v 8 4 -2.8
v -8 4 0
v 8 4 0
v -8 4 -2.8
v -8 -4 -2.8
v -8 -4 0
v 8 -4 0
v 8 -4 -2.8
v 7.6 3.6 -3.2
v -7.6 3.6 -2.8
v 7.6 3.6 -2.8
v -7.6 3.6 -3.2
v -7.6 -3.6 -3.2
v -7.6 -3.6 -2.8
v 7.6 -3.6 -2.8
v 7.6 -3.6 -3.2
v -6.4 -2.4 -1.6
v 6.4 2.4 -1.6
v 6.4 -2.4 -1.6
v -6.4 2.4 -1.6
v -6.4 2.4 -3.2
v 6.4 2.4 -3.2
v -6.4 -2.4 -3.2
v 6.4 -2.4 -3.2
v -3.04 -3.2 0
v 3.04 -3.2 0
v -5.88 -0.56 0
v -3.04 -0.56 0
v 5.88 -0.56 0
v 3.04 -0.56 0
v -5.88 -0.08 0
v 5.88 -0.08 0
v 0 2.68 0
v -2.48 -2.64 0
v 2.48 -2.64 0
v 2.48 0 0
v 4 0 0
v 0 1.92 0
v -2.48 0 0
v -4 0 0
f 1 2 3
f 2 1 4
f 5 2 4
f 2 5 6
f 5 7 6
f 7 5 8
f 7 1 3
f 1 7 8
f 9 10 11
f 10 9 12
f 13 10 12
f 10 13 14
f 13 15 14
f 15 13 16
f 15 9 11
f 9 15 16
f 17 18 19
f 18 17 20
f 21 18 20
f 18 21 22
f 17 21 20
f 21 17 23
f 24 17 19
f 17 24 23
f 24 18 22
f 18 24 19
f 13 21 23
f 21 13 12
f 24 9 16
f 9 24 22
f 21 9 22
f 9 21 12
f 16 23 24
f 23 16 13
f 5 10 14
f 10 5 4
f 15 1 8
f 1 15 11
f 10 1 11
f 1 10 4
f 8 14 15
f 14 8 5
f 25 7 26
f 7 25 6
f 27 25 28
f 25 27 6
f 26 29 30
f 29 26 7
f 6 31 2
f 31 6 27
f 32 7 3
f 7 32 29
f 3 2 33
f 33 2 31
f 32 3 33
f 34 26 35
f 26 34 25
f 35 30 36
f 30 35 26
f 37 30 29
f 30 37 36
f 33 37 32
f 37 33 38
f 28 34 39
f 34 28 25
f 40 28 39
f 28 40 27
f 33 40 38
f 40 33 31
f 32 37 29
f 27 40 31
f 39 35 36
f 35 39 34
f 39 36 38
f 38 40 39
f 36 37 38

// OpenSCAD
// file: ../p/box5.scad
use <../lib.scad>
function ldraw_lib__box5() = [
// 0 Box with 5 Faces and All Edges
// 0 Name: box5.dat
// 0 Author: James Jessiman
// 0 !LDRAW_ORG Primitive UPDATE 2012-01
// 0 !LICENSE Licensed under CC BY 2.0 and CC BY 4.0 : see CAreadme.txt
// 
// 0 BFC CERTIFY CCW
  [0,"BFC","CERTIFY"],
  [0,"BFC","CCW"],
// 
// 0 !HISTORY 2002-04-03 [sbliss] Modified for BFC compliance
// 0 !HISTORY 2002-04-25 [PTadmin] Official Update 2002-02
// 0 !HISTORY 2007-06-24 [PTadmin] Header formatted for Contributor Agreement
// 0 !HISTORY 2008-07-01 [PTadmin] Official Update 2008-01
// 0 !HISTORY 2012-02-16 [Philo] Changed to CCW
// 0 !HISTORY 2012-03-30 [PTadmin] Official Update 2012-01
// 
// 
// 2 24 1 1 1 -1 1 1
  [2,24,1,1,1,-1,1,1],
// 2 24 -1 1 1 -1 1 -1
  [2,24,-1,1,1,-1,1,-1],
// 2 24 -1 1 -1 1 1 -1
  [2,24,-1,1,-1,1,1,-1],
// 2 24 1 1 -1 1 1 1
  [2,24,1,1,-1,1,1,1],
// 2 24 1 0 1 -1 0 1
  [2,24,1,0,1,-1,0,1],
// 2 24 -1 0 1 -1 0 -1
  [2,24,-1,0,1,-1,0,-1],
// 2 24 -1 0 -1 1 0 -1
  [2,24,-1,0,-1,1,0,-1],
// 2 24 1 0 -1 1 0 1
  [2,24,1,0,-1,1,0,1],
// 2 24 1 0 1 1 1 1
  [2,24,1,0,1,1,1,1],
// 2 24 -1 0 1 -1 1 1
  [2,24,-1,0,1,-1,1,1],
// 2 24 1 0 -1 1 1 -1
  [2,24,1,0,-1,1,1,-1],
// 2 24 -1 0 -1 -1 1 -1
  [2,24,-1,0,-1,-1,1,-1],
// 4 16 -1 1 1 1 1 1 1 1 -1 -1 1 -1
  [4,16,-1,1,1,1,1,1,1,1,-1,-1,1,-1],
// 4 16 -1 1 1 -1 0 1 1 0 1 1 1 1
  [4,16,-1,1,1,-1,0,1,1,0,1,1,1,1],
// 4 16 -1 1 -1 -1 0 -1 -1 0 1 -1 1 1
  [4,16,-1,1,-1,-1,0,-1,-1,0,1,-1,1,1],
// 4 16 1 1 -1 1 0 -1 -1 0 -1 -1 1 -1
  [4,16,1,1,-1,1,0,-1,-1,0,-1,-1,1,-1],
// 4 16 1 1 1 1 0 1 1 0 -1 1 1 -1
  [4,16,1,1,1,1,0,1,1,0,-1,1,1,-1],
];
makepoly(ldraw_lib__box5(), line=0.2);
// file: ../p/box4.scad
use <../lib.scad>
function ldraw_lib__box4() = [
// 0 Box with 4 Faces (2 Parallel Pairs) and All Edges
// 0 Name: box4.dat
// 0 Author: James Jessiman
// 0 !LDRAW_ORG Primitive UPDATE 2012-01
// 0 !LICENSE Licensed under CC BY 2.0 and CC BY 4.0 : see CAreadme.txt
// 
// 0 BFC CERTIFY CCW
  [0,"BFC","CERTIFY"],
  [0,"BFC","CCW"],
// 
// 0 !HISTORY 2002-04-03 [sbliss] Modified for BFC compliance
// 0 !HISTORY 2002-04-25 [PTadmin] Official Update 2002-02
// 0 !HISTORY 2007-06-24 [PTadmin] Header formatted for Contributor Agreement
// 0 !HISTORY 2008-07-01 [PTadmin] Official Update 2008-01
// 0 !HISTORY 2012-02-16 [Philo] Changed to CCW
// 0 !HISTORY 2012-03-30 [PTadmin] Official Update 2012-01
// 
// 
// 2 24 1 1 1 -1 1 1
  [2,24,1,1,1,-1,1,1],
// 2 24 -1 1 1 -1 1 -1
  [2,24,-1,1,1,-1,1,-1],
// 2 24 -1 1 -1 1 1 -1
  [2,24,-1,1,-1,1,1,-1],
// 2 24 1 1 -1 1 1 1
  [2,24,1,1,-1,1,1,1],
// 2 24 1 0 1 -1 0 1
  [2,24,1,0,1,-1,0,1],
// 2 24 -1 0 1 -1 0 -1
  [2,24,-1,0,1,-1,0,-1],
// 2 24 -1 0 -1 1 0 -1
  [2,24,-1,0,-1,1,0,-1],
// 2 24 1 0 -1 1 0 1
  [2,24,1,0,-1,1,0,1],
// 2 24 1 0 1 1 1 1
  [2,24,1,0,1,1,1,1],
// 2 24 -1 0 1 -1 1 1
  [2,24,-1,0,1,-1,1,1],
// 2 24 1 0 -1 1 1 -1
  [2,24,1,0,-1,1,1,-1],
// 2 24 -1 0 -1 -1 1 -1
  [2,24,-1,0,-1,-1,1,-1],
// 4 16 -1 1 1 -1 0 1 1 0 1 1 1 1
  [4,16,-1,1,1,-1,0,1,1,0,1,1,1,1],
// 4 16 -1 1 -1 -1 0 -1 -1 0 1 -1 1 1
  [4,16,-1,1,-1,-1,0,-1,-1,0,1,-1,1,1],
// 4 16 1 1 -1 1 0 -1 -1 0 -1 -1 1 -1
  [4,16,1,1,-1,1,0,-1,-1,0,-1,-1,1,-1],
// 4 16 1 1 1 1 0 1 1 0 -1 1 1 -1
  [4,16,1,1,1,1,0,1,1,0,-1,1,1,-1],
];
makepoly(ldraw_lib__box4(), line=0.2);
// file: s/3069p13c.scad
use <../../lib.scad>
function ldraw_lib__s__3069p13c() = [
// 0 ~Tile  1 x  2 with Arrow Short Pattern - Arrow
// 0 Name: s\3069p13c.dat
// 0 Author: Alex Taylor [anathema]
// 0 !LDRAW_ORG Subpart UPDATE 2010-02
// 0 !LICENSE Licensed under CC BY 2.0 and CC BY 4.0 : see CAreadme.txt
// 
// 0 BFC CERTIFY CCW
  [0,"BFC","CERTIFY"],
  [0,"BFC","CCW"],
// 
// 0 !HISTORY 2010-07-05 [PTadmin] Official Update 2010-02
// 
// 
// 4 16 -6.2 0 -6.6 6.2 0 -6.6 6.2 0 0 -6.2 0 0
  [4,16,-6.2,0,-6.6,6.2,0,-6.6,6.2,0,0,-6.2,0,0],
// 3 16 -6.2 0 0 6.2 0 0 0 0 4.8
  [3,16,-6.2,0,0,6.2,0,0,0,0,4.8],
// 3 16 0 0 4.8 -10 0 0 -6.2 0 0
  [3,16,0,0,4.8,-10,0,0,-6.2,0,0],
// 3 16 6.2 0 0 10 0 0 0 0 4.8
  [3,16,6.2,0,0,10,0,0,0,0,4.8],
// 0
];
makepoly(ldraw_lib__s__3069p13c(), line=0.2);
// file: s/3069p13b.scad
use <../../lib.scad>
function ldraw_lib__s__3069p13b() = [
// 0 ~Tile  1 x  2 with Arrow Short Pattern - Border
// 0 Name: s\3069p13b.dat
// 0 Author: Alex Taylor [anathema]
// 0 !LDRAW_ORG Subpart UPDATE 2010-02
// 0 !LICENSE Licensed under CC BY 2.0 and CC BY 4.0 : see CAreadme.txt
// 
// 0 BFC CERTIFY CCW
  [0,"BFC","CERTIFY"],
  [0,"BFC","CCW"],
// 
// 0 !HISTORY 2010-07-05 [PTadmin] Official Update 2010-02
// 
// 
// 4 16 -7.6 0 -8 7.6 0 -8 6.2 0 -6.6 -6.2 0 -6.6
  [4,16,-7.6,0,-8,7.6,0,-8,6.2,0,-6.6,-6.2,0,-6.6],
// 4 16 6.2 0 0 6.2 0 -6.6 7.6 0 -8 7.6 0 -1.4
  [4,16,6.2,0,0,6.2,0,-6.6,7.6,0,-8,7.6,0,-1.4],
// 4 16 7.6 0 -1.4 14.7 0 -1.4 10 0 0 6.2 0 0
  [4,16,7.6,0,-1.4,14.7,0,-1.4,10,0,0,6.2,0,0],
// 4 16 0 0 4.8 10 0 0 14.7 0 -0.2 0 0 6.7
  [4,16,0,0,4.8,10,0,0,14.7,0,-0.2,0,0,6.7],
// 4 16 -7.6 0 -1.4 -7.6 0 -8 -6.2 0 -6.6 -6.2 0 0
  [4,16,-7.6,0,-1.4,-7.6,0,-8,-6.2,0,-6.6,-6.2,0,0],
// 4 16 -6.2 0 0 -10 0 0 -14.7 0 -1.4 -7.6 0 -1.4
  [4,16,-6.2,0,0,-10,0,0,-14.7,0,-1.4,-7.6,0,-1.4],
// 4 16 0 0 6.7 -14.7 0 -0.2 -10 0 0 0 0 4.8
  [4,16,0,0,6.7,-14.7,0,-0.2,-10,0,0,0,0,4.8],
// 3 16 14.7 0 -0.2 10 0 0 14.7 0 -1.4
  [3,16,14.7,0,-0.2,10,0,0,14.7,0,-1.4],
// 3 16 -14.7 0 -1.4 -10 0 0 -14.7 0 -0.2
  [3,16,-14.7,0,-1.4,-10,0,0,-14.7,0,-0.2],
// 0
];
makepoly(ldraw_lib__s__3069p13b(), line=0.2);
// file: s/3069p13a.scad
use <../../lib.scad>
function ldraw_lib__s__3069p13a() = [
// 0 ~Tile  1 x  2 with Arrow Short Pattern - Mask
// 0 Name: s\3069p13a.dat
// 0 Author: Alex Taylor [anathema]
// 0 !LDRAW_ORG Subpart UPDATE 2010-02
// 0 !LICENSE Licensed under CC BY 2.0 and CC BY 4.0 : see CAreadme.txt
// 
// 0 BFC CERTIFY CCW
  [0,"BFC","CERTIFY"],
  [0,"BFC","CCW"],
// 
// 0 !HISTORY 2010-07-05 [PTadmin] Official Update 2010-02
// 
// 
// 4 16 -20 0 -10 20 0 -10 7.6 0 -8 -7.6 0 -8
  [4,16,-20,0,-10,20,0,-10,7.6,0,-8,-7.6,0,-8],
// 4 16 -7.6 0 -8 -7.6 0 -1.4 -14.7 0 -1.4 -20 0 -10
  [4,16,-7.6,0,-8,-7.6,0,-1.4,-14.7,0,-1.4,-20,0,-10],
// 4 16 20 0 -10 14.7 0 -1.4 7.6 0 -1.4 7.6 0 -8
  [4,16,20,0,-10,14.7,0,-1.4,7.6,0,-1.4,7.6,0,-8],
// 4 16 -20 0 -10 -14.7 0 -1.4 -14.7 0 -0.2 -20 0 10
  [4,16,-20,0,-10,-14.7,0,-1.4,-14.7,0,-0.2,-20,0,10],
// 4 16 20 0 10 14.7 0 -0.2 14.7 0 -1.4 20 0 -10
  [4,16,20,0,10,14.7,0,-0.2,14.7,0,-1.4,20,0,-10],
// 3 16 20 0 10 -20 0 10 0 0 6.7
  [3,16,20,0,10,-20,0,10,0,0,6.7],
// 3 16 0 0 6.7 -20 0 10 -14.7 0 -0.2
  [3,16,0,0,6.7,-20,0,10,-14.7,0,-0.2],
// 3 16 14.7 0 -0.2 20 0 10 0 0 6.7
  [3,16,14.7,0,-0.2,20,0,10,0,0,6.7],
// 0
];
makepoly(ldraw_lib__s__3069p13a(), line=0.2);
// file: s/3069bs01.scad
use <../../lib.scad>
use <../../p/box4.scad>
use <../../p/box5.scad>
function ldraw_lib__s__3069bs01() = [
// 0 ~Tile  1 x  2 with Groove without Top Face
// 0 Name: s\3069bs01.dat
// 0 Author: Santeri Piippo [arezey]
// 0 !LDRAW_ORG Subpart UPDATE 2010-02
// 0 !LICENSE Licensed under CC BY 2.0 and CC BY 4.0 : see CAreadme.txt
// 
// 0 BFC CERTIFY CCW
  [0,"BFC","CERTIFY"],
  [0,"BFC","CCW"],
// 
// 0 !HISTORY 2010-07-05 [PTadmin] Official Update 2010-02
// 
// 
// 1 16 0 0 0 20 0 0 0 7 0 0 0 10 box4.dat
  [1,16,0,0,0,20,0,0,0,7,0,0,0,10, ldraw_lib__box4()],
// 1 16 0 7 0 19 0 0 0 1 0 0 0 9 box4.dat
  [1,16,0,7,0,19,0,0,0,1,0,0,0,9, ldraw_lib__box4()],
// 0 BFC INVERTNEXT
  [0,"BFC","INVERTNEXT"],
// 1 16 0 8 0 16 0 0 0 -4 0 0 0 6 box5.dat
  [1,16,0,8,0,16,0,0,0,-4,0,0,0,6, ldraw_lib__box5()],
// 4 16 -19 8 9 -16 8 6 -16 8 -6 -19 8 -9
  [4,16,-19,8,9,-16,8,6,-16,8,-6,-19,8,-9],
// 4 16 19 8 -9 16 8 -6 16 8 6 19 8 9
  [4,16,19,8,-9,16,8,-6,16,8,6,19,8,9],
// 4 16 19 8 9 16 8 6 -16 8 6 -19 8 9
  [4,16,19,8,9,16,8,6,-16,8,6,-19,8,9],
// 4 16 -19 8 -9 -16 8 -6 16 8 -6 19 8 -9
  [4,16,-19,8,-9,-16,8,-6,16,8,-6,19,8,-9],
// 4 16 -20 7 10 -19 7 9 -19 7 -9 -20 7 -10
  [4,16,-20,7,10,-19,7,9,-19,7,-9,-20,7,-10],
// 4 16 20 7 -10 19 7 -9 19 7 9 20 7 10
  [4,16,20,7,-10,19,7,-9,19,7,9,20,7,10],
// 4 16 20 7 10 19 7 9 -19 7 9 -20 7 10
  [4,16,20,7,10,19,7,9,-19,7,9,-20,7,10],
// 4 16 -20 7 -10 -19 7 -9 19 7 -9 20 7 -10
  [4,16,-20,7,-10,-19,7,-9,19,7,-9,20,7,-10],
// 0 //
];
makepoly(ldraw_lib__s__3069bs01(), line=0.2);
// file: 3069bp15.scad
use <../lib.scad>
use <s/3069bs01.scad>
use <s/3069p13a.scad>
use <s/3069p13b.scad>
use <s/3069p13c.scad>
function ldraw_lib__3069bp15() = [
// 0 Tile  1 x  2 with Arrow Short DkRed with Silver Border Pattern
// 0 Name: 3069bp15.dat
// 0 Author: James Jessiman
// 0 !LDRAW_ORG Part UPDATE 2013-01
// 0 !LICENSE Licensed under CC BY 2.0 and CC BY 4.0 : see CAreadme.txt
// 
// 0 BFC CERTIFY CCW
  [0,"BFC","CERTIFY"],
  [0,"BFC","CCW"],
// 
// 0 !HISTORY 2007-06-13 [PTadmin] Header formatted for Contributor Agreement
// 0 !HISTORY 2008-07-01 [PTadmin] Official Update 2008-01
// 0 !HISTORY 2009-08-15 [anathema] Rebuilt using new subparts
// 0 !HISTORY 2009-08-19 [PTadmin] Renamed from 3069p15
// 0 !HISTORY 2010-07-05 [PTadmin] Official Update 2010-02
// 0 !HISTORY 2013-02-17 [MagFors] Changed colour 179 to 80 (printed silver)
// 0 !HISTORY 2013-07-21 [PTadmin] Official Update 2013-01
// 
// 
// 1 16 0 0 0 1 0 0 0 1 0 0 0 1 s\3069bs01.dat
  [1,16,0,0,0,1,0,0,0,1,0,0,0,1, ldraw_lib__s__3069bs01()],
// 1 16 0 0 0 1 0 0 0 1 0 0 0 1 s\3069p13a.dat
  [1,16,0,0,0,1,0,0,0,1,0,0,0,1, ldraw_lib__s__3069p13a()],
// 1 80 0 0 0 1 0 0 0 1 0 0 0 1 s\3069p13b.dat
  [1,80,0,0,0,1,0,0,0,1,0,0,0,1, ldraw_lib__s__3069p13b()],
// 1 320 0 0 0 1 0 0 0 1 0 0 0 1 s\3069p13c.dat
  [1,320,0,0,0,1,0,0,0,1,0,0,0,1, ldraw_lib__s__3069p13c()],
];
makepoly(ldraw_lib__3069bp15(), line=0.2);
// main file
use <../lib.scad>
use <3069bp15.scad>
function ldraw_lib__3069p15() = [
// 0 ~Moved to 3069bp15
// 0 Name: 3069p15.dat
// 0 Author: [PTadmin]
// 0 !LDRAW_ORG Part UPDATE 2010-02
// 0 !LICENSE Licensed under CC BY 4.0 : see CAreadme.txt
// 
// 0 BFC CERTIFY CCW
  [0,"BFC","CERTIFY"],
  [0,"BFC","CCW"],
// 
// 0 !HISTORY 2010-07-05 [PTadmin] Official Update 2010-02
// 
// 
// 0 // Tile 1 x 2 with Short Red Arrow with Grey Border Pattern
// 1 16 0 0 0 1 0 0 0 1 0 0 0 1 3069bp15.dat
  [1,16,0,0,0,1,0,0,0,1,0,0,0,1, ldraw_lib__3069bp15()],
];
makepoly(ldraw_lib__3069p15(), line=0.2);
